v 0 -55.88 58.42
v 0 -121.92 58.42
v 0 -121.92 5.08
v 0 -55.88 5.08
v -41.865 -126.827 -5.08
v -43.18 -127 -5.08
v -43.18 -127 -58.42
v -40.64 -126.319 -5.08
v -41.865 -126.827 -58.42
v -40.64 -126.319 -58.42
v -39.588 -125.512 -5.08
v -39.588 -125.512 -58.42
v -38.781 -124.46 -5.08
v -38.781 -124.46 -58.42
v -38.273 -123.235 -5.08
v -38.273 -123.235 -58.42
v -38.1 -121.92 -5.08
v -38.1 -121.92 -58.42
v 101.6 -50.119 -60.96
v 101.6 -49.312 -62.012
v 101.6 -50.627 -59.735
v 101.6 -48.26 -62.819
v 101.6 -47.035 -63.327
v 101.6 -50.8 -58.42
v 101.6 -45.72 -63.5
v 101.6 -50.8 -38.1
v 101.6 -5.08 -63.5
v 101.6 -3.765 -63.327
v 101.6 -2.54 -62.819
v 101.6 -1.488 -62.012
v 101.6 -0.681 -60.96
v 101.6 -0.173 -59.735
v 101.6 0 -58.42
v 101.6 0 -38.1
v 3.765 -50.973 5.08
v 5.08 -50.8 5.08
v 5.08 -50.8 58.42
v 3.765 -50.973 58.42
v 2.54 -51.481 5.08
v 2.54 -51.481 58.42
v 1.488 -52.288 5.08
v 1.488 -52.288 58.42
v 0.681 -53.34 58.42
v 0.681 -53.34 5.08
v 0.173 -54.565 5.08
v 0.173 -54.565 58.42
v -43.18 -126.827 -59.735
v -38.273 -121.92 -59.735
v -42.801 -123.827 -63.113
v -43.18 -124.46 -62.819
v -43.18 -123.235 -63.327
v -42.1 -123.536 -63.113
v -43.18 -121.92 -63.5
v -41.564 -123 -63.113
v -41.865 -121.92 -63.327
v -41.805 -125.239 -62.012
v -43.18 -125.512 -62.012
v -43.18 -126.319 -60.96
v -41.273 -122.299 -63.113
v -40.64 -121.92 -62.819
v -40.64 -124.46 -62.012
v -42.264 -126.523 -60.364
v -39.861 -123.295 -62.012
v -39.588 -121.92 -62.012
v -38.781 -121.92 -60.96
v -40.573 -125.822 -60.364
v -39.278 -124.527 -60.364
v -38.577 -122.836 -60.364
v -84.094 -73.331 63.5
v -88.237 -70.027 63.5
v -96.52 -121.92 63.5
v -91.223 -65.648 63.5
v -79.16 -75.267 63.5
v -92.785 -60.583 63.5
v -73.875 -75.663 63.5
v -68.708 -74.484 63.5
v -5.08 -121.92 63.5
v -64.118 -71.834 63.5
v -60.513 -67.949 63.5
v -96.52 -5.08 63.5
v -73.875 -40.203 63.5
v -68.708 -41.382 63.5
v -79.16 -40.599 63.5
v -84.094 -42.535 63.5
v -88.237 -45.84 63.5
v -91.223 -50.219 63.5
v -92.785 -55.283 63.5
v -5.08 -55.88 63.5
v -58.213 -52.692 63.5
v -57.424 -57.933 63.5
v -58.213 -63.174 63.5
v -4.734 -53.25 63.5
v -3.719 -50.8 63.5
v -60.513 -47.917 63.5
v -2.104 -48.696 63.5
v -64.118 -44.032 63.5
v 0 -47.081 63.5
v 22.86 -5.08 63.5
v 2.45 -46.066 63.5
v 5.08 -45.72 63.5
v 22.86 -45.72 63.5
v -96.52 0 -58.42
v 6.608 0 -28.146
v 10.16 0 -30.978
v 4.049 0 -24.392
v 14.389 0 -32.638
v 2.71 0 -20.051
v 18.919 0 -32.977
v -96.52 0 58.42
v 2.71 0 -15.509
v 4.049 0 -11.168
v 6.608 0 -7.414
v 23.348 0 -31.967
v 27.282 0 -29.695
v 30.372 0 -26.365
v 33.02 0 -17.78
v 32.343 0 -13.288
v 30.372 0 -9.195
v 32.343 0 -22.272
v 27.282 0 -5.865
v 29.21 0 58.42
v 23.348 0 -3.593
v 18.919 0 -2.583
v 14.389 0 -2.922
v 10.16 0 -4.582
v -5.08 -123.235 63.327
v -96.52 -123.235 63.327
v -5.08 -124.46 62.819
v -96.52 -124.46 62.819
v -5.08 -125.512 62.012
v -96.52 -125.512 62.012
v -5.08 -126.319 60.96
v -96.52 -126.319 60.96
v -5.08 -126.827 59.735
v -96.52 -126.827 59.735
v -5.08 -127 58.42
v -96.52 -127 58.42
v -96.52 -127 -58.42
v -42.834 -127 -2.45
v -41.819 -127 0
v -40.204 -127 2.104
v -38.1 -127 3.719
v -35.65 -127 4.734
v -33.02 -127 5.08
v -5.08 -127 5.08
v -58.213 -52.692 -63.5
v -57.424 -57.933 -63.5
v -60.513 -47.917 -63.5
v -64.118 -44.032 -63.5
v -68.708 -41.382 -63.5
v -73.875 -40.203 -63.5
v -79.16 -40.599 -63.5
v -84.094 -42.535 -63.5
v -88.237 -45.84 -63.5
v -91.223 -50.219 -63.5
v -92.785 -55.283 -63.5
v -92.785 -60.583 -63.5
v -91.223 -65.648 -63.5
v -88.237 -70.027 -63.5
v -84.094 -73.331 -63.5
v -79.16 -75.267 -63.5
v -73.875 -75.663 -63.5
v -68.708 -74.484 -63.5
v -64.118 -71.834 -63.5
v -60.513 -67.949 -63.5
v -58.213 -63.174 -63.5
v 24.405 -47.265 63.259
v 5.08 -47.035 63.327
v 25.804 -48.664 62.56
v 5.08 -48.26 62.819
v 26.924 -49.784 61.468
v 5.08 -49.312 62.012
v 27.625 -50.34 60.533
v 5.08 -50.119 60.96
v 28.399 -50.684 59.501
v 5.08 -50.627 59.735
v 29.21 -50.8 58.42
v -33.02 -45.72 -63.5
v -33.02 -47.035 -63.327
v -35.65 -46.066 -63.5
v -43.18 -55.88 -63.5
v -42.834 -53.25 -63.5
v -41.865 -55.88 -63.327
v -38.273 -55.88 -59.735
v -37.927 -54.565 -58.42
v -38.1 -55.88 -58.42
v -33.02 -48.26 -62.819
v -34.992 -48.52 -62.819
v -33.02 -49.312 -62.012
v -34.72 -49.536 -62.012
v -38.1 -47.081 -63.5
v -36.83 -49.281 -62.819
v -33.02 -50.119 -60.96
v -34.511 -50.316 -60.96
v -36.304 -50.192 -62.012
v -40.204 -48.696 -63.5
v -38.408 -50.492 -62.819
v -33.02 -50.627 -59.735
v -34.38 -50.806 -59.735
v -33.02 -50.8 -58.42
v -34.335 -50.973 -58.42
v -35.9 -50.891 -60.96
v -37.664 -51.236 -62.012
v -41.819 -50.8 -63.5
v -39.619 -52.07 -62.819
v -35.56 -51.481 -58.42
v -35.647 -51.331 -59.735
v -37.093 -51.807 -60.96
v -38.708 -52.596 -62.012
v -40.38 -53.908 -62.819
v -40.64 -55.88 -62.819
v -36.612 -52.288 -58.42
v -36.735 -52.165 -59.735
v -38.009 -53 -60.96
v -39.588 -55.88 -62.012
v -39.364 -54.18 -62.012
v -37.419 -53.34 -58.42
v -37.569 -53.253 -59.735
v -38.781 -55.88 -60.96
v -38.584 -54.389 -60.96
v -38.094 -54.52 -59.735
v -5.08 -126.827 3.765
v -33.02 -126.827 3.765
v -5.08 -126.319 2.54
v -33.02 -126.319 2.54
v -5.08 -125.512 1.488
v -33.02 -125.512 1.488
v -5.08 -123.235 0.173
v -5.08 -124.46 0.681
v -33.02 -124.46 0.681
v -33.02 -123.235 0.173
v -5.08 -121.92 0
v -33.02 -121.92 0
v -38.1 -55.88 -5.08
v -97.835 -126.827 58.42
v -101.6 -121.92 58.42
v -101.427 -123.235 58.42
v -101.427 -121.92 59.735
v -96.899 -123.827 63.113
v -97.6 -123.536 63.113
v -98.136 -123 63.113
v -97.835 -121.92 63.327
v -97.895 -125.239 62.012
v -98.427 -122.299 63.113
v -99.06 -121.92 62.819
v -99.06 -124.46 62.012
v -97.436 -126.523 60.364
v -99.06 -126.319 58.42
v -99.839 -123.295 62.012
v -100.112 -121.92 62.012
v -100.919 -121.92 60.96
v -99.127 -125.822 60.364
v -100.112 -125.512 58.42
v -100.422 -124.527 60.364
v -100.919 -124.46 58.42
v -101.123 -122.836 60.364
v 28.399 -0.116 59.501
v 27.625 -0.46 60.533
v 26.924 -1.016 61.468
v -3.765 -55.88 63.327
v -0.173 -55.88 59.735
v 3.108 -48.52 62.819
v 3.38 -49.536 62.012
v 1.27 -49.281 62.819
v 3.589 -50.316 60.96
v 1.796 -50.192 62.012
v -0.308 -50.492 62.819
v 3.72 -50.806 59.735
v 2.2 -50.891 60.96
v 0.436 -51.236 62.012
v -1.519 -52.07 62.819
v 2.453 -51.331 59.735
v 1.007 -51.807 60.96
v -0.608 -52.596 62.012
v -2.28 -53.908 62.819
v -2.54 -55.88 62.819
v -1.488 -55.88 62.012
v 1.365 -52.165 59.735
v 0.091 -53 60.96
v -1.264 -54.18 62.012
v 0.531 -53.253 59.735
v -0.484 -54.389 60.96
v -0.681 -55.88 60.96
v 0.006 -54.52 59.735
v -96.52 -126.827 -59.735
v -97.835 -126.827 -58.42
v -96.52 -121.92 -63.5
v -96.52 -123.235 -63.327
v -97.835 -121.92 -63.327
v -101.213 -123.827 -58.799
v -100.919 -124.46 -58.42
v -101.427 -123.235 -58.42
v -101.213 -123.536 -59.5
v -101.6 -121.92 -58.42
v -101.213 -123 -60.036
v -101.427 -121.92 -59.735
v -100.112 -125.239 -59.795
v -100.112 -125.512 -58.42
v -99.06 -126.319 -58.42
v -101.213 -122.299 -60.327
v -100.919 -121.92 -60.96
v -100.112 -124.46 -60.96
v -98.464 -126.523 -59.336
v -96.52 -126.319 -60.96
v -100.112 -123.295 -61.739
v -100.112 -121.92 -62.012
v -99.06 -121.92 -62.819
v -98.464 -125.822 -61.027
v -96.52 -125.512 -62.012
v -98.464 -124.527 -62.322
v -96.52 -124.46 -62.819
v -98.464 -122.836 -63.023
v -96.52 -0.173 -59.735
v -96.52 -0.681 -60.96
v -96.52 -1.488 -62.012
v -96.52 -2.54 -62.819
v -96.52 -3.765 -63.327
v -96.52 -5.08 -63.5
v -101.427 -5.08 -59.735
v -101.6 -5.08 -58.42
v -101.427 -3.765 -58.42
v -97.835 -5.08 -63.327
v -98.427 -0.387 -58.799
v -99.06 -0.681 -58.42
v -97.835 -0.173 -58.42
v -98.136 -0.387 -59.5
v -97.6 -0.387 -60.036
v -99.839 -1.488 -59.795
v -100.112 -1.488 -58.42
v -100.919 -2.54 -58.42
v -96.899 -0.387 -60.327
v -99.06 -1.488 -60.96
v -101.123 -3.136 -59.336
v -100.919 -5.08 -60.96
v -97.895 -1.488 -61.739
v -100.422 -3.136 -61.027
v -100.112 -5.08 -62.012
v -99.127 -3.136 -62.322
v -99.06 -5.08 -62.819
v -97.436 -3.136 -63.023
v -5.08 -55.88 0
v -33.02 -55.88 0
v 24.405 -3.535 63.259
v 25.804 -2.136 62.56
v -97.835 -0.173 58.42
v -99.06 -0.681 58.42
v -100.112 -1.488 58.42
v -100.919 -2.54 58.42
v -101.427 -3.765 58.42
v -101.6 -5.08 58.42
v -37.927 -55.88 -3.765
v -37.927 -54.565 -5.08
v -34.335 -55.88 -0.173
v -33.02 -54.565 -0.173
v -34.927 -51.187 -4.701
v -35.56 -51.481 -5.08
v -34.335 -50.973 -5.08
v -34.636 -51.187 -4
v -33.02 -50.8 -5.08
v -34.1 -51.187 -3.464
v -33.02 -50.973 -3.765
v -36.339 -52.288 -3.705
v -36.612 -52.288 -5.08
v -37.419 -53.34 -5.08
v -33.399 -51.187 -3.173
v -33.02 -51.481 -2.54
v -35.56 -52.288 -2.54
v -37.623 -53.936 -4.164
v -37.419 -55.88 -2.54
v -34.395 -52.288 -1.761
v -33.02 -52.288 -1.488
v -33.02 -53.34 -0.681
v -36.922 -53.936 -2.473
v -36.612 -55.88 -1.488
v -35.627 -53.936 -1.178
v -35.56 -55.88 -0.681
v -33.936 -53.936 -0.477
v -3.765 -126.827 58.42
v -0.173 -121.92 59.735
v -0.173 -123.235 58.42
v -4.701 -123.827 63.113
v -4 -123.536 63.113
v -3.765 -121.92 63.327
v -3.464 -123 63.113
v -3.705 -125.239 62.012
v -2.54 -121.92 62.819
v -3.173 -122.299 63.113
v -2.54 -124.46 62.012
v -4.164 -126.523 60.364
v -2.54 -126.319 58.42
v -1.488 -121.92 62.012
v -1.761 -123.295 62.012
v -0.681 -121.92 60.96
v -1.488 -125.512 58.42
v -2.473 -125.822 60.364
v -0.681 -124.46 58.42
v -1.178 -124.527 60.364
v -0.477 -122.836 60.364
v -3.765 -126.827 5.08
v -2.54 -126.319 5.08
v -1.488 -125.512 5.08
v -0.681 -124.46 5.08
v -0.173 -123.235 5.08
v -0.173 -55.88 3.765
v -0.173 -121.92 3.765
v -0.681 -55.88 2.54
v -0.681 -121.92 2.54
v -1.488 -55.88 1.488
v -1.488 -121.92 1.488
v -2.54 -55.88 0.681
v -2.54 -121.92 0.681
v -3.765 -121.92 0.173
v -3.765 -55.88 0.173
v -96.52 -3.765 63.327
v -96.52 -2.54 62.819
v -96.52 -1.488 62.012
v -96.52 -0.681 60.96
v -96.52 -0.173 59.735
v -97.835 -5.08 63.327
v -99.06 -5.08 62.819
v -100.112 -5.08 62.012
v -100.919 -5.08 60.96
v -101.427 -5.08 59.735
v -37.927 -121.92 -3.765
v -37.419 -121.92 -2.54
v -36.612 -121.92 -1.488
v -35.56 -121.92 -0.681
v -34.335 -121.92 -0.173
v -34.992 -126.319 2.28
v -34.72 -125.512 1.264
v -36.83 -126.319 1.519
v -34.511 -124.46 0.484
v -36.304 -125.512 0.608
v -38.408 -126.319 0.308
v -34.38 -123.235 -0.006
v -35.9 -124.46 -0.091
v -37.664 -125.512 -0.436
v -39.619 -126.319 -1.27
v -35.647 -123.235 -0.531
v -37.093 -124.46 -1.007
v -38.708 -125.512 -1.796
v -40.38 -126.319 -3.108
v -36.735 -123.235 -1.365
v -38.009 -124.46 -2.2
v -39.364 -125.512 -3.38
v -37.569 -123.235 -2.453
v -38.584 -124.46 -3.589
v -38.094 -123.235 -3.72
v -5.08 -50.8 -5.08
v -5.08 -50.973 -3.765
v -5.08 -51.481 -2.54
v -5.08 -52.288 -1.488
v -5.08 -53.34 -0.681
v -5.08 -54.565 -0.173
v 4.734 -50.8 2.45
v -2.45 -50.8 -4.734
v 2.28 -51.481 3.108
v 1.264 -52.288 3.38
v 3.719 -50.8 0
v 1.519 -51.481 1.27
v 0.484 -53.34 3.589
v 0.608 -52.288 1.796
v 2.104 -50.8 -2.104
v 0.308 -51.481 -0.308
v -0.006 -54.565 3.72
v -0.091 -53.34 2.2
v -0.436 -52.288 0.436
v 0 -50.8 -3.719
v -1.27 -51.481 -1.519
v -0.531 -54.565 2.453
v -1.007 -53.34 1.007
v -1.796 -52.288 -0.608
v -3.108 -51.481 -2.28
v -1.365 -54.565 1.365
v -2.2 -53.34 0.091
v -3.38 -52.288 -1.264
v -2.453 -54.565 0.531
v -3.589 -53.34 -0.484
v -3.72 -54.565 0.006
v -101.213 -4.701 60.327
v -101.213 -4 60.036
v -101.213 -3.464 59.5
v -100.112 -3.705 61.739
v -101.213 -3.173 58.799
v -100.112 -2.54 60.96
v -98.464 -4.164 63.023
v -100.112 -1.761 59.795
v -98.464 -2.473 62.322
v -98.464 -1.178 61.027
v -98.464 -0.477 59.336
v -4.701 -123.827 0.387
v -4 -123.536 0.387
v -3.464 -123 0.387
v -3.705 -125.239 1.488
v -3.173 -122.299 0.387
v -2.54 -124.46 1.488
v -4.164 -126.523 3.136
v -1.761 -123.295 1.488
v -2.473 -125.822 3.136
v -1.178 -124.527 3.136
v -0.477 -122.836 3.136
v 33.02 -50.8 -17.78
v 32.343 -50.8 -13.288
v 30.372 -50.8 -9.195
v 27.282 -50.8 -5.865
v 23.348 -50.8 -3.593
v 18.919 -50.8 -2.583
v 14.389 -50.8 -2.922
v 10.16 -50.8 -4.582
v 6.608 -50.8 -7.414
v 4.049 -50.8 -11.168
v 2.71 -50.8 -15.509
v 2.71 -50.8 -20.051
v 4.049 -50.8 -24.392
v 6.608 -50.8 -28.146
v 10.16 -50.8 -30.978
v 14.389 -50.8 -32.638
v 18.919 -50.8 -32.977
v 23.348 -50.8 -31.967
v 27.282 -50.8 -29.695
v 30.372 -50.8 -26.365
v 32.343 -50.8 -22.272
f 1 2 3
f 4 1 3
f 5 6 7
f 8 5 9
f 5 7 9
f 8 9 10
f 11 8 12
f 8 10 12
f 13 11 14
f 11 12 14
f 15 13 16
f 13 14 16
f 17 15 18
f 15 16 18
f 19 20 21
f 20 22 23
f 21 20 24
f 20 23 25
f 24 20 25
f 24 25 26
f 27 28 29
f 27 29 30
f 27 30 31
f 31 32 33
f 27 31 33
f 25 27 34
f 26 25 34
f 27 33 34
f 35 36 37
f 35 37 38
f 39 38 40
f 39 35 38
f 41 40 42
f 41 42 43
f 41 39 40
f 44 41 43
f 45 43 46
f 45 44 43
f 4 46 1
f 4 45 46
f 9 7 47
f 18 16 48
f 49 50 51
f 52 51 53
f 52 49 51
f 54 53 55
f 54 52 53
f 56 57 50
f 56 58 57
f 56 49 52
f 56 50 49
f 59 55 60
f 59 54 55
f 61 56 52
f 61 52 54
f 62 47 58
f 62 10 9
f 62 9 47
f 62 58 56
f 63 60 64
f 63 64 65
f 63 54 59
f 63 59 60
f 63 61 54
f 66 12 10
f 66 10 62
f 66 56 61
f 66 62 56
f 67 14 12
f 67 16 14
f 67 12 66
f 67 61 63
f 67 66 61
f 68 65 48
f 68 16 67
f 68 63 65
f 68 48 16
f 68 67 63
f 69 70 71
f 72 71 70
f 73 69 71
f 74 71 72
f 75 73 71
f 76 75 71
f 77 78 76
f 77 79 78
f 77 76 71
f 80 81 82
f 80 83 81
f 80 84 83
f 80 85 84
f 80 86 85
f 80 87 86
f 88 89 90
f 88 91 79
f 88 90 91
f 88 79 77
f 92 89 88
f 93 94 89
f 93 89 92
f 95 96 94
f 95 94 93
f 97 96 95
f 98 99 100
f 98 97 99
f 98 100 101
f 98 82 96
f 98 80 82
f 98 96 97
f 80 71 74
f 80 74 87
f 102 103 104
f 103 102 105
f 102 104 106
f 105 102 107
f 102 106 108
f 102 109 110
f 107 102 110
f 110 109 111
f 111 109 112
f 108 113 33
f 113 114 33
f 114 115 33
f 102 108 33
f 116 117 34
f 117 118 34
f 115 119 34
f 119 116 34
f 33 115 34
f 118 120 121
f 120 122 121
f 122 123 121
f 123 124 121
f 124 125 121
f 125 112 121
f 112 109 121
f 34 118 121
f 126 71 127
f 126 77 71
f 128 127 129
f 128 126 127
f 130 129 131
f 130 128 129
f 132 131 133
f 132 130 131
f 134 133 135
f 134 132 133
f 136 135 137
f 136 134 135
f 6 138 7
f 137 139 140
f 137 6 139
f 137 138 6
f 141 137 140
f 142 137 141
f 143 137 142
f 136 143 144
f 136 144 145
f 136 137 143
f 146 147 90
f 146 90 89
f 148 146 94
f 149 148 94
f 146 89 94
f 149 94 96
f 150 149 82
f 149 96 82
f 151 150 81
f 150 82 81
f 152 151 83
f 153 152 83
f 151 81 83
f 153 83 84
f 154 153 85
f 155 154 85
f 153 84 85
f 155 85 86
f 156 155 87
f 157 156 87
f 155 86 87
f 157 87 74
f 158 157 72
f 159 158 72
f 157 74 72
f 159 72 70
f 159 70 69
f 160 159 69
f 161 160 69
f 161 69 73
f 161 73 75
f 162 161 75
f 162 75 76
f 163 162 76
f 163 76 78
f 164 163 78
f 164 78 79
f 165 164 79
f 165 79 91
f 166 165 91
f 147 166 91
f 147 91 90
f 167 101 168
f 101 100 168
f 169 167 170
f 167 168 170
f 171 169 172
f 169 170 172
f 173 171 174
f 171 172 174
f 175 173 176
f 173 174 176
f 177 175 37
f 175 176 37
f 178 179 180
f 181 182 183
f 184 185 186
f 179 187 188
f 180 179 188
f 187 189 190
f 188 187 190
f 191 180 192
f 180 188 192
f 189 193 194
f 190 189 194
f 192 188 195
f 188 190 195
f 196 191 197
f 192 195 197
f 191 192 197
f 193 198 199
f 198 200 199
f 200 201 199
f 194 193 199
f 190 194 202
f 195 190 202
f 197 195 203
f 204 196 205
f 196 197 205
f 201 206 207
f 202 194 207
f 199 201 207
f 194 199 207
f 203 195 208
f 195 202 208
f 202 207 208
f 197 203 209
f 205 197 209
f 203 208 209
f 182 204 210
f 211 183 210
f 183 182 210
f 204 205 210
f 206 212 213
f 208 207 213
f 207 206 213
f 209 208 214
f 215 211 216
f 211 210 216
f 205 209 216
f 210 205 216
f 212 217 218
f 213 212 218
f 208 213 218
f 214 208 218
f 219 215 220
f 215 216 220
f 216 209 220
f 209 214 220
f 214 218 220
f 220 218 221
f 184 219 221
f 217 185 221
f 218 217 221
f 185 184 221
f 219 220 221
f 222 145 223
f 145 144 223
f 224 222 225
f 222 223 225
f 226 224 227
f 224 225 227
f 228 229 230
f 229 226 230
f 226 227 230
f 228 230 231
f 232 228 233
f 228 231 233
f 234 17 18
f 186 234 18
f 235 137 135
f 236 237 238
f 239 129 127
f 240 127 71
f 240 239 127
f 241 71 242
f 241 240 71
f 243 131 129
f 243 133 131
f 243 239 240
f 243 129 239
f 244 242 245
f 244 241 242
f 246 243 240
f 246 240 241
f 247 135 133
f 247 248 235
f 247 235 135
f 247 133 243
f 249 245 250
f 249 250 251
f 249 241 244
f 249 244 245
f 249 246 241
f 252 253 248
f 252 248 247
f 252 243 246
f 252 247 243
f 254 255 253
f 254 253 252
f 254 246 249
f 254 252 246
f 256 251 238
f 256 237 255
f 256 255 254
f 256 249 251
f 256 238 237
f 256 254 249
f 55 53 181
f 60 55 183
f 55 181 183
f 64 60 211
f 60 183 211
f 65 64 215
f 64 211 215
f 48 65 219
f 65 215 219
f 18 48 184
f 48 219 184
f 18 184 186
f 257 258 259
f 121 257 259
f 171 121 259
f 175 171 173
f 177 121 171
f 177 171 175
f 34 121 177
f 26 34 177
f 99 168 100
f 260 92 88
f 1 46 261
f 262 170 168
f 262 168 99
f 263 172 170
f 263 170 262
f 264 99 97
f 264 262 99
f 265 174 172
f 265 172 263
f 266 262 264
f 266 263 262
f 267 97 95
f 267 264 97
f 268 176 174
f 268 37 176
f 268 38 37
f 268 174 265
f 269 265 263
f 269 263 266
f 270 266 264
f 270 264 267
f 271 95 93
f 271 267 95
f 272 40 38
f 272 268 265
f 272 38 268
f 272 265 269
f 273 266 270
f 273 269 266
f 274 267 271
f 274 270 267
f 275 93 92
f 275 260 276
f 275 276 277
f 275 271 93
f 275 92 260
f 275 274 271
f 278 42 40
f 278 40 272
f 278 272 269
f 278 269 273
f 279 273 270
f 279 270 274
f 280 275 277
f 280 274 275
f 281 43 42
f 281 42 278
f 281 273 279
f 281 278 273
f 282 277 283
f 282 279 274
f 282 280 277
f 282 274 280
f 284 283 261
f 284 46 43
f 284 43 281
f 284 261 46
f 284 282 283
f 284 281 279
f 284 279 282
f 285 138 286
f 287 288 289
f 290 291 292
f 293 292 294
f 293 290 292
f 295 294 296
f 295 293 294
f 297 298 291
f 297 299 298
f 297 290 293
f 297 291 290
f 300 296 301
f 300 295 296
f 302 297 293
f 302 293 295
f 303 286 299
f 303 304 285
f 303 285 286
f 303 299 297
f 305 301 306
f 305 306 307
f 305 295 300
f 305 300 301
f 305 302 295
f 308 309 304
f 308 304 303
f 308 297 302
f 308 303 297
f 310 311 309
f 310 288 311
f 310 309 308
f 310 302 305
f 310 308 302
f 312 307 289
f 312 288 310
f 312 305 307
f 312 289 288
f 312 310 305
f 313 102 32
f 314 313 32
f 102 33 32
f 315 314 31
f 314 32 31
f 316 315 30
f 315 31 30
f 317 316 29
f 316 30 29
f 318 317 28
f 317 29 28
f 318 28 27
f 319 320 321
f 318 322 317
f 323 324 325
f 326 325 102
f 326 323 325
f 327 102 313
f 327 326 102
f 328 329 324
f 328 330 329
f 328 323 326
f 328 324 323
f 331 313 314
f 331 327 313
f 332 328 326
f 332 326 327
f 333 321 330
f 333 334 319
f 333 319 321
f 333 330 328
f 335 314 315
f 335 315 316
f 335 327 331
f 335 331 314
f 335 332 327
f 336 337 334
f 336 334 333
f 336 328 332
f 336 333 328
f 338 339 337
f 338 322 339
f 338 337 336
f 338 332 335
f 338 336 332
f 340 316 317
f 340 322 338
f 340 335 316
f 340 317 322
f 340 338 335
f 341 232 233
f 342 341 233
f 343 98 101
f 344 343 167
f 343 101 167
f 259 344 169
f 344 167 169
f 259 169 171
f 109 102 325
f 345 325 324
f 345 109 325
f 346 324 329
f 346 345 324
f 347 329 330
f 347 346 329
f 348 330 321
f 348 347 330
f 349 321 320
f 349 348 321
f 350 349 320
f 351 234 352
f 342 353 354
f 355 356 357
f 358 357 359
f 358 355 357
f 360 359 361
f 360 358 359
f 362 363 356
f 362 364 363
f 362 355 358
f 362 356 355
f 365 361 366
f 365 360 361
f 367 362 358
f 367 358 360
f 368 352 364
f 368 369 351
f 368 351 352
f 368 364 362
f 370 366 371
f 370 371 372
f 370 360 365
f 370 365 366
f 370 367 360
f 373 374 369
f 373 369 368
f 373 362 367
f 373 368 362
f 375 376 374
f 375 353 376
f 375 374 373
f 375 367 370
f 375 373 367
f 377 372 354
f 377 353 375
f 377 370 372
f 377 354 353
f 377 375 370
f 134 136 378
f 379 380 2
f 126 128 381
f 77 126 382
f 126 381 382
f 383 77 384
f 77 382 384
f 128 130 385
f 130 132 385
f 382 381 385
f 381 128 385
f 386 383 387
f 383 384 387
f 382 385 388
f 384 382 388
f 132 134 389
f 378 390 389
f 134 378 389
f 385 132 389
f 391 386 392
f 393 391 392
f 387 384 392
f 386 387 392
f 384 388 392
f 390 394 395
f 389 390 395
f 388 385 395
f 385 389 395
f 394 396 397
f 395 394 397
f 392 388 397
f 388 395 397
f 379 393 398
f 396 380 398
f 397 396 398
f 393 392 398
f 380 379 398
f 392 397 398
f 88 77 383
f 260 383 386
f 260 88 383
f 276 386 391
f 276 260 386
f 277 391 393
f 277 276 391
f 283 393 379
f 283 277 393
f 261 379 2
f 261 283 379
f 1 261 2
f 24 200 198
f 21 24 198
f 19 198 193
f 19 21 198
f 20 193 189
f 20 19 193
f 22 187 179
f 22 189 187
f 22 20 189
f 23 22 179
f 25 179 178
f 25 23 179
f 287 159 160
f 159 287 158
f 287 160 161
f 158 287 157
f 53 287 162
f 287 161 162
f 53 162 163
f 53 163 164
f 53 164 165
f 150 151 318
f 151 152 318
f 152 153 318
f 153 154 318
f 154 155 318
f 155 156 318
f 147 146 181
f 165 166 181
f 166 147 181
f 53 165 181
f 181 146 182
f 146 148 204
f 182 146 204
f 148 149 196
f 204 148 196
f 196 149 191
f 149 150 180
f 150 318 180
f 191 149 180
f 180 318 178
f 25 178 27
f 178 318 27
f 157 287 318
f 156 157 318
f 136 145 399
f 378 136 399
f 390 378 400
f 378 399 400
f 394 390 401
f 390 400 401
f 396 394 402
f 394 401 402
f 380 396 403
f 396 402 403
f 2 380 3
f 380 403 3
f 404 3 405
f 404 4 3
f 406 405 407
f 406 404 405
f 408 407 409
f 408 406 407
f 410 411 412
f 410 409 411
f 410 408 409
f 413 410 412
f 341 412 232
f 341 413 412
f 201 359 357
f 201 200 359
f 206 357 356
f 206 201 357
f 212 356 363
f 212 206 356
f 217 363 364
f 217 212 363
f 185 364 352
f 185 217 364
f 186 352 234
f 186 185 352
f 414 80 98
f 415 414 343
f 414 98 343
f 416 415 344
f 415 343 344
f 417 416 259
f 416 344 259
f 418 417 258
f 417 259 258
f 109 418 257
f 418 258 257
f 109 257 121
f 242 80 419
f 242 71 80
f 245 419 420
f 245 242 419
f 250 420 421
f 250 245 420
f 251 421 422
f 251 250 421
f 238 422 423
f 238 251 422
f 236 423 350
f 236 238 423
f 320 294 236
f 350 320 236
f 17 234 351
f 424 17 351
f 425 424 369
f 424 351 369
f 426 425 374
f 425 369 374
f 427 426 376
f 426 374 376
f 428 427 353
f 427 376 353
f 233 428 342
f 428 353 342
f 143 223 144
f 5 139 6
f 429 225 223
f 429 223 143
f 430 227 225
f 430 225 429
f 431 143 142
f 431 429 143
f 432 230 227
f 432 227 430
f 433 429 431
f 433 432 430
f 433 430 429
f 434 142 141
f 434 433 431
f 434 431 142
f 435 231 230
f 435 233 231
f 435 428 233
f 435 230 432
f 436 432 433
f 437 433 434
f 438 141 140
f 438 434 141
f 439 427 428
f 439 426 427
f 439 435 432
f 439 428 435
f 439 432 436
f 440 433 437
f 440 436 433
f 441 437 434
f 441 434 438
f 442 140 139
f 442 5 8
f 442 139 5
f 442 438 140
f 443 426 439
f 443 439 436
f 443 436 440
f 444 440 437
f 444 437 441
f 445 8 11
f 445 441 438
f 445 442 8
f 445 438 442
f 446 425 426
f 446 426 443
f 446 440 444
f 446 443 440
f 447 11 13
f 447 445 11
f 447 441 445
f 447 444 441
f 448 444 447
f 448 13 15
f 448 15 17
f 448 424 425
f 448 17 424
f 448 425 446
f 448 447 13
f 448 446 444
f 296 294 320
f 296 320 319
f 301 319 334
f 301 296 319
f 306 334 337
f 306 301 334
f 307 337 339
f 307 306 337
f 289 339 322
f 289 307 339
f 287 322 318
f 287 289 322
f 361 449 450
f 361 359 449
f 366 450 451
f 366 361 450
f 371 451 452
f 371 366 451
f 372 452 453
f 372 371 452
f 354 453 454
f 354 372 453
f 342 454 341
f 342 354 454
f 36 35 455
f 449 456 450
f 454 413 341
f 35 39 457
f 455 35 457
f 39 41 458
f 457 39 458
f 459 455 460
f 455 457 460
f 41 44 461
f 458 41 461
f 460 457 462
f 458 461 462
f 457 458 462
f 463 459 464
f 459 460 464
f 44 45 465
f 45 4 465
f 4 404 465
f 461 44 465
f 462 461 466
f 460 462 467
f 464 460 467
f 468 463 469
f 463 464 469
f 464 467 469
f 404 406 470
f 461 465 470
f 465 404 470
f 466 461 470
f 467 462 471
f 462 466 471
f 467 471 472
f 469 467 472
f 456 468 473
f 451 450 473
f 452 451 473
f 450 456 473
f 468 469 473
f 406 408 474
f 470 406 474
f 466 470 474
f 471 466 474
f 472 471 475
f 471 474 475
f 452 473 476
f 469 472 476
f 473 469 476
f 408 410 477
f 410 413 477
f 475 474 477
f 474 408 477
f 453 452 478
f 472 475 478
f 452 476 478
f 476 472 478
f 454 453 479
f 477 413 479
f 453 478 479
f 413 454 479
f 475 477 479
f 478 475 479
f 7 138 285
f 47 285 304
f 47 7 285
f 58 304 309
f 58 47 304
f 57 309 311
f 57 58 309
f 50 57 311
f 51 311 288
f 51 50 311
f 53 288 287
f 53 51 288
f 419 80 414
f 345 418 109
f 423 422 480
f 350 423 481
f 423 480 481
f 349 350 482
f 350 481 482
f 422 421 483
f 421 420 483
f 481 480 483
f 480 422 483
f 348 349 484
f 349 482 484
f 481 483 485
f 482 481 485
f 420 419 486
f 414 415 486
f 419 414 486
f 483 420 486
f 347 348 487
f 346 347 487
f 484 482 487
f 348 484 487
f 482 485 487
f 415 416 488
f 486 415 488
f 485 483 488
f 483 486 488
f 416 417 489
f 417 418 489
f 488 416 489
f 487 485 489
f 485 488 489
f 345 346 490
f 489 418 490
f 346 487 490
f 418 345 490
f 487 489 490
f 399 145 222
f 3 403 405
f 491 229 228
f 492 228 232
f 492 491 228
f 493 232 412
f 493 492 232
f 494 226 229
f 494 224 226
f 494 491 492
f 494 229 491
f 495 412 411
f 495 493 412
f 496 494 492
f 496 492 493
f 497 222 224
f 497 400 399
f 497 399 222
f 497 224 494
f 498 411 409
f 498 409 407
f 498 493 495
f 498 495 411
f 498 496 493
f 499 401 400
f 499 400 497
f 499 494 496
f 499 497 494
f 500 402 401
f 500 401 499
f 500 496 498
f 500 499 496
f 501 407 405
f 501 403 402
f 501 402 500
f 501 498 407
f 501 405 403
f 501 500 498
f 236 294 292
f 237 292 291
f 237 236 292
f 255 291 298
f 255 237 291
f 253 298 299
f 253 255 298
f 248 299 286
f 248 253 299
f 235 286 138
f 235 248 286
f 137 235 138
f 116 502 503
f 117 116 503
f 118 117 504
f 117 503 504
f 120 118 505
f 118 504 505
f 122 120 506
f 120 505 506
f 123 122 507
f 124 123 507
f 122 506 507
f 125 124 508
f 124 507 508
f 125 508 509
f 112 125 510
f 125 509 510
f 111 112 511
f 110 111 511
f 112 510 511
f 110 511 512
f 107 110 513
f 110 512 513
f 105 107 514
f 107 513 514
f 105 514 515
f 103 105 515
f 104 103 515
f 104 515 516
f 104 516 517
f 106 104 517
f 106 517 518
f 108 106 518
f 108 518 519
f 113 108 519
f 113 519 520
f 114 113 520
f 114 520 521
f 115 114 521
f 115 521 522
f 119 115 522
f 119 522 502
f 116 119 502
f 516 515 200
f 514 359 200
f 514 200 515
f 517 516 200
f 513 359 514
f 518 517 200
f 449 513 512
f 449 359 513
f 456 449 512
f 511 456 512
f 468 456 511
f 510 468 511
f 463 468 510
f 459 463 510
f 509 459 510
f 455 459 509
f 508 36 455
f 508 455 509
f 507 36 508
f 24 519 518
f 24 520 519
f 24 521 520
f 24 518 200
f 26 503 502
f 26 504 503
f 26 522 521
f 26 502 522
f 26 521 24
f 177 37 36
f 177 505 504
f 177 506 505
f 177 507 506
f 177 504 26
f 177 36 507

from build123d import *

# Parameters (mm, degrees)
F0_W     = 203.2
F0_H     = 127
F1_DEPTH = 127
F3_DEPTH = 76.2
F4_SIZE2 = 101.6
F4_SIZE  = 76.2
F5_R     = 5.08
F6_R     = 15.24
F7_DEPTH = 50.801
F8_R     = 17.78
F9_DEPTH = 127.001


with BuildPart() as f1:
    # F0 (on Front) → F1 (new body)
    with BuildSketch(Plane.XZ):
        Rectangle(F0_W, F0_H)
    extrude(amount=F1_DEPTH)

    # F2 (on face) → F3 (cut)
    with BuildSketch(Plane.XZ.offset(127)):
        Polygon((-38.1, 0), (-38.1, -63.5), (101.6, -63.5), (101.6, 63.5), (0, 63.5), (0, 0), align=None)
    extrude(amount=-F3_DEPTH, mode=Mode.SUBTRACT)

    # F4
    f4_edges = [f1.edges().sort_by_distance(p)[0] for p in [
        (101.6, -25.4, 63.5),
    ]]
    f4_side = f1.faces().sort_by_distance((-21.771429, -52.614286, 63.5))[0]
    chamfer(f4_edges, length=F4_SIZE, length2=F4_SIZE2, reference=f4_side)

    # F5
    f5_edges = [f1.edges().sort_by_distance(p)[0] for p in [
        (0, -127, 31.75),
        (-19.05, -127, 0),
        (-38.1, -127, -31.75),
        (-69.85, -127, -63.5),
        (-101.6, -127, 0),
        (-50.8, -127, 63.5),
        (0, -88.9, 63.5),
        (0, -88.9, 0),
        (0, -50.8, 31.75),
        (-38.1, -88.9, 0),
        (-38.1, -88.9, -63.5),
        (-38.1, -50.8, -31.75),
        (-38.1, 0, 63.5),
        (25.4, -25.4, 63.5),
        (-101.6, -63.5, 63.5),
        (12.7, -50.8, 63.5),
        (-101.6, -63.5, -63.5),
        (-101.6, 0, 0),
        (0, 0, -63.5),
        (31.75, -50.8, -63.5),
        (-19.05, -50.8, 0),
    ]]
    fillet(f5_edges, radius=F5_R)

    # F6 (on face) → F7 (cut, through all)
    with BuildSketch(Plane.XZ.offset(50.8)):
        with Locations((17.78, -17.78)):
            Circle(F6_R)
    extrude(amount=-F7_DEPTH, mode=Mode.SUBTRACT)

    # F8 (on face) → F9 (cut, through all)
    with BuildSketch(Plane.XY.offset(63.5)):
        with Locations((-75.203537941, -57.9331703484)):
            Circle(F8_R)
    extrude(amount=-F9_DEPTH, mode=Mode.SUBTRACT)


solid = f1.part
